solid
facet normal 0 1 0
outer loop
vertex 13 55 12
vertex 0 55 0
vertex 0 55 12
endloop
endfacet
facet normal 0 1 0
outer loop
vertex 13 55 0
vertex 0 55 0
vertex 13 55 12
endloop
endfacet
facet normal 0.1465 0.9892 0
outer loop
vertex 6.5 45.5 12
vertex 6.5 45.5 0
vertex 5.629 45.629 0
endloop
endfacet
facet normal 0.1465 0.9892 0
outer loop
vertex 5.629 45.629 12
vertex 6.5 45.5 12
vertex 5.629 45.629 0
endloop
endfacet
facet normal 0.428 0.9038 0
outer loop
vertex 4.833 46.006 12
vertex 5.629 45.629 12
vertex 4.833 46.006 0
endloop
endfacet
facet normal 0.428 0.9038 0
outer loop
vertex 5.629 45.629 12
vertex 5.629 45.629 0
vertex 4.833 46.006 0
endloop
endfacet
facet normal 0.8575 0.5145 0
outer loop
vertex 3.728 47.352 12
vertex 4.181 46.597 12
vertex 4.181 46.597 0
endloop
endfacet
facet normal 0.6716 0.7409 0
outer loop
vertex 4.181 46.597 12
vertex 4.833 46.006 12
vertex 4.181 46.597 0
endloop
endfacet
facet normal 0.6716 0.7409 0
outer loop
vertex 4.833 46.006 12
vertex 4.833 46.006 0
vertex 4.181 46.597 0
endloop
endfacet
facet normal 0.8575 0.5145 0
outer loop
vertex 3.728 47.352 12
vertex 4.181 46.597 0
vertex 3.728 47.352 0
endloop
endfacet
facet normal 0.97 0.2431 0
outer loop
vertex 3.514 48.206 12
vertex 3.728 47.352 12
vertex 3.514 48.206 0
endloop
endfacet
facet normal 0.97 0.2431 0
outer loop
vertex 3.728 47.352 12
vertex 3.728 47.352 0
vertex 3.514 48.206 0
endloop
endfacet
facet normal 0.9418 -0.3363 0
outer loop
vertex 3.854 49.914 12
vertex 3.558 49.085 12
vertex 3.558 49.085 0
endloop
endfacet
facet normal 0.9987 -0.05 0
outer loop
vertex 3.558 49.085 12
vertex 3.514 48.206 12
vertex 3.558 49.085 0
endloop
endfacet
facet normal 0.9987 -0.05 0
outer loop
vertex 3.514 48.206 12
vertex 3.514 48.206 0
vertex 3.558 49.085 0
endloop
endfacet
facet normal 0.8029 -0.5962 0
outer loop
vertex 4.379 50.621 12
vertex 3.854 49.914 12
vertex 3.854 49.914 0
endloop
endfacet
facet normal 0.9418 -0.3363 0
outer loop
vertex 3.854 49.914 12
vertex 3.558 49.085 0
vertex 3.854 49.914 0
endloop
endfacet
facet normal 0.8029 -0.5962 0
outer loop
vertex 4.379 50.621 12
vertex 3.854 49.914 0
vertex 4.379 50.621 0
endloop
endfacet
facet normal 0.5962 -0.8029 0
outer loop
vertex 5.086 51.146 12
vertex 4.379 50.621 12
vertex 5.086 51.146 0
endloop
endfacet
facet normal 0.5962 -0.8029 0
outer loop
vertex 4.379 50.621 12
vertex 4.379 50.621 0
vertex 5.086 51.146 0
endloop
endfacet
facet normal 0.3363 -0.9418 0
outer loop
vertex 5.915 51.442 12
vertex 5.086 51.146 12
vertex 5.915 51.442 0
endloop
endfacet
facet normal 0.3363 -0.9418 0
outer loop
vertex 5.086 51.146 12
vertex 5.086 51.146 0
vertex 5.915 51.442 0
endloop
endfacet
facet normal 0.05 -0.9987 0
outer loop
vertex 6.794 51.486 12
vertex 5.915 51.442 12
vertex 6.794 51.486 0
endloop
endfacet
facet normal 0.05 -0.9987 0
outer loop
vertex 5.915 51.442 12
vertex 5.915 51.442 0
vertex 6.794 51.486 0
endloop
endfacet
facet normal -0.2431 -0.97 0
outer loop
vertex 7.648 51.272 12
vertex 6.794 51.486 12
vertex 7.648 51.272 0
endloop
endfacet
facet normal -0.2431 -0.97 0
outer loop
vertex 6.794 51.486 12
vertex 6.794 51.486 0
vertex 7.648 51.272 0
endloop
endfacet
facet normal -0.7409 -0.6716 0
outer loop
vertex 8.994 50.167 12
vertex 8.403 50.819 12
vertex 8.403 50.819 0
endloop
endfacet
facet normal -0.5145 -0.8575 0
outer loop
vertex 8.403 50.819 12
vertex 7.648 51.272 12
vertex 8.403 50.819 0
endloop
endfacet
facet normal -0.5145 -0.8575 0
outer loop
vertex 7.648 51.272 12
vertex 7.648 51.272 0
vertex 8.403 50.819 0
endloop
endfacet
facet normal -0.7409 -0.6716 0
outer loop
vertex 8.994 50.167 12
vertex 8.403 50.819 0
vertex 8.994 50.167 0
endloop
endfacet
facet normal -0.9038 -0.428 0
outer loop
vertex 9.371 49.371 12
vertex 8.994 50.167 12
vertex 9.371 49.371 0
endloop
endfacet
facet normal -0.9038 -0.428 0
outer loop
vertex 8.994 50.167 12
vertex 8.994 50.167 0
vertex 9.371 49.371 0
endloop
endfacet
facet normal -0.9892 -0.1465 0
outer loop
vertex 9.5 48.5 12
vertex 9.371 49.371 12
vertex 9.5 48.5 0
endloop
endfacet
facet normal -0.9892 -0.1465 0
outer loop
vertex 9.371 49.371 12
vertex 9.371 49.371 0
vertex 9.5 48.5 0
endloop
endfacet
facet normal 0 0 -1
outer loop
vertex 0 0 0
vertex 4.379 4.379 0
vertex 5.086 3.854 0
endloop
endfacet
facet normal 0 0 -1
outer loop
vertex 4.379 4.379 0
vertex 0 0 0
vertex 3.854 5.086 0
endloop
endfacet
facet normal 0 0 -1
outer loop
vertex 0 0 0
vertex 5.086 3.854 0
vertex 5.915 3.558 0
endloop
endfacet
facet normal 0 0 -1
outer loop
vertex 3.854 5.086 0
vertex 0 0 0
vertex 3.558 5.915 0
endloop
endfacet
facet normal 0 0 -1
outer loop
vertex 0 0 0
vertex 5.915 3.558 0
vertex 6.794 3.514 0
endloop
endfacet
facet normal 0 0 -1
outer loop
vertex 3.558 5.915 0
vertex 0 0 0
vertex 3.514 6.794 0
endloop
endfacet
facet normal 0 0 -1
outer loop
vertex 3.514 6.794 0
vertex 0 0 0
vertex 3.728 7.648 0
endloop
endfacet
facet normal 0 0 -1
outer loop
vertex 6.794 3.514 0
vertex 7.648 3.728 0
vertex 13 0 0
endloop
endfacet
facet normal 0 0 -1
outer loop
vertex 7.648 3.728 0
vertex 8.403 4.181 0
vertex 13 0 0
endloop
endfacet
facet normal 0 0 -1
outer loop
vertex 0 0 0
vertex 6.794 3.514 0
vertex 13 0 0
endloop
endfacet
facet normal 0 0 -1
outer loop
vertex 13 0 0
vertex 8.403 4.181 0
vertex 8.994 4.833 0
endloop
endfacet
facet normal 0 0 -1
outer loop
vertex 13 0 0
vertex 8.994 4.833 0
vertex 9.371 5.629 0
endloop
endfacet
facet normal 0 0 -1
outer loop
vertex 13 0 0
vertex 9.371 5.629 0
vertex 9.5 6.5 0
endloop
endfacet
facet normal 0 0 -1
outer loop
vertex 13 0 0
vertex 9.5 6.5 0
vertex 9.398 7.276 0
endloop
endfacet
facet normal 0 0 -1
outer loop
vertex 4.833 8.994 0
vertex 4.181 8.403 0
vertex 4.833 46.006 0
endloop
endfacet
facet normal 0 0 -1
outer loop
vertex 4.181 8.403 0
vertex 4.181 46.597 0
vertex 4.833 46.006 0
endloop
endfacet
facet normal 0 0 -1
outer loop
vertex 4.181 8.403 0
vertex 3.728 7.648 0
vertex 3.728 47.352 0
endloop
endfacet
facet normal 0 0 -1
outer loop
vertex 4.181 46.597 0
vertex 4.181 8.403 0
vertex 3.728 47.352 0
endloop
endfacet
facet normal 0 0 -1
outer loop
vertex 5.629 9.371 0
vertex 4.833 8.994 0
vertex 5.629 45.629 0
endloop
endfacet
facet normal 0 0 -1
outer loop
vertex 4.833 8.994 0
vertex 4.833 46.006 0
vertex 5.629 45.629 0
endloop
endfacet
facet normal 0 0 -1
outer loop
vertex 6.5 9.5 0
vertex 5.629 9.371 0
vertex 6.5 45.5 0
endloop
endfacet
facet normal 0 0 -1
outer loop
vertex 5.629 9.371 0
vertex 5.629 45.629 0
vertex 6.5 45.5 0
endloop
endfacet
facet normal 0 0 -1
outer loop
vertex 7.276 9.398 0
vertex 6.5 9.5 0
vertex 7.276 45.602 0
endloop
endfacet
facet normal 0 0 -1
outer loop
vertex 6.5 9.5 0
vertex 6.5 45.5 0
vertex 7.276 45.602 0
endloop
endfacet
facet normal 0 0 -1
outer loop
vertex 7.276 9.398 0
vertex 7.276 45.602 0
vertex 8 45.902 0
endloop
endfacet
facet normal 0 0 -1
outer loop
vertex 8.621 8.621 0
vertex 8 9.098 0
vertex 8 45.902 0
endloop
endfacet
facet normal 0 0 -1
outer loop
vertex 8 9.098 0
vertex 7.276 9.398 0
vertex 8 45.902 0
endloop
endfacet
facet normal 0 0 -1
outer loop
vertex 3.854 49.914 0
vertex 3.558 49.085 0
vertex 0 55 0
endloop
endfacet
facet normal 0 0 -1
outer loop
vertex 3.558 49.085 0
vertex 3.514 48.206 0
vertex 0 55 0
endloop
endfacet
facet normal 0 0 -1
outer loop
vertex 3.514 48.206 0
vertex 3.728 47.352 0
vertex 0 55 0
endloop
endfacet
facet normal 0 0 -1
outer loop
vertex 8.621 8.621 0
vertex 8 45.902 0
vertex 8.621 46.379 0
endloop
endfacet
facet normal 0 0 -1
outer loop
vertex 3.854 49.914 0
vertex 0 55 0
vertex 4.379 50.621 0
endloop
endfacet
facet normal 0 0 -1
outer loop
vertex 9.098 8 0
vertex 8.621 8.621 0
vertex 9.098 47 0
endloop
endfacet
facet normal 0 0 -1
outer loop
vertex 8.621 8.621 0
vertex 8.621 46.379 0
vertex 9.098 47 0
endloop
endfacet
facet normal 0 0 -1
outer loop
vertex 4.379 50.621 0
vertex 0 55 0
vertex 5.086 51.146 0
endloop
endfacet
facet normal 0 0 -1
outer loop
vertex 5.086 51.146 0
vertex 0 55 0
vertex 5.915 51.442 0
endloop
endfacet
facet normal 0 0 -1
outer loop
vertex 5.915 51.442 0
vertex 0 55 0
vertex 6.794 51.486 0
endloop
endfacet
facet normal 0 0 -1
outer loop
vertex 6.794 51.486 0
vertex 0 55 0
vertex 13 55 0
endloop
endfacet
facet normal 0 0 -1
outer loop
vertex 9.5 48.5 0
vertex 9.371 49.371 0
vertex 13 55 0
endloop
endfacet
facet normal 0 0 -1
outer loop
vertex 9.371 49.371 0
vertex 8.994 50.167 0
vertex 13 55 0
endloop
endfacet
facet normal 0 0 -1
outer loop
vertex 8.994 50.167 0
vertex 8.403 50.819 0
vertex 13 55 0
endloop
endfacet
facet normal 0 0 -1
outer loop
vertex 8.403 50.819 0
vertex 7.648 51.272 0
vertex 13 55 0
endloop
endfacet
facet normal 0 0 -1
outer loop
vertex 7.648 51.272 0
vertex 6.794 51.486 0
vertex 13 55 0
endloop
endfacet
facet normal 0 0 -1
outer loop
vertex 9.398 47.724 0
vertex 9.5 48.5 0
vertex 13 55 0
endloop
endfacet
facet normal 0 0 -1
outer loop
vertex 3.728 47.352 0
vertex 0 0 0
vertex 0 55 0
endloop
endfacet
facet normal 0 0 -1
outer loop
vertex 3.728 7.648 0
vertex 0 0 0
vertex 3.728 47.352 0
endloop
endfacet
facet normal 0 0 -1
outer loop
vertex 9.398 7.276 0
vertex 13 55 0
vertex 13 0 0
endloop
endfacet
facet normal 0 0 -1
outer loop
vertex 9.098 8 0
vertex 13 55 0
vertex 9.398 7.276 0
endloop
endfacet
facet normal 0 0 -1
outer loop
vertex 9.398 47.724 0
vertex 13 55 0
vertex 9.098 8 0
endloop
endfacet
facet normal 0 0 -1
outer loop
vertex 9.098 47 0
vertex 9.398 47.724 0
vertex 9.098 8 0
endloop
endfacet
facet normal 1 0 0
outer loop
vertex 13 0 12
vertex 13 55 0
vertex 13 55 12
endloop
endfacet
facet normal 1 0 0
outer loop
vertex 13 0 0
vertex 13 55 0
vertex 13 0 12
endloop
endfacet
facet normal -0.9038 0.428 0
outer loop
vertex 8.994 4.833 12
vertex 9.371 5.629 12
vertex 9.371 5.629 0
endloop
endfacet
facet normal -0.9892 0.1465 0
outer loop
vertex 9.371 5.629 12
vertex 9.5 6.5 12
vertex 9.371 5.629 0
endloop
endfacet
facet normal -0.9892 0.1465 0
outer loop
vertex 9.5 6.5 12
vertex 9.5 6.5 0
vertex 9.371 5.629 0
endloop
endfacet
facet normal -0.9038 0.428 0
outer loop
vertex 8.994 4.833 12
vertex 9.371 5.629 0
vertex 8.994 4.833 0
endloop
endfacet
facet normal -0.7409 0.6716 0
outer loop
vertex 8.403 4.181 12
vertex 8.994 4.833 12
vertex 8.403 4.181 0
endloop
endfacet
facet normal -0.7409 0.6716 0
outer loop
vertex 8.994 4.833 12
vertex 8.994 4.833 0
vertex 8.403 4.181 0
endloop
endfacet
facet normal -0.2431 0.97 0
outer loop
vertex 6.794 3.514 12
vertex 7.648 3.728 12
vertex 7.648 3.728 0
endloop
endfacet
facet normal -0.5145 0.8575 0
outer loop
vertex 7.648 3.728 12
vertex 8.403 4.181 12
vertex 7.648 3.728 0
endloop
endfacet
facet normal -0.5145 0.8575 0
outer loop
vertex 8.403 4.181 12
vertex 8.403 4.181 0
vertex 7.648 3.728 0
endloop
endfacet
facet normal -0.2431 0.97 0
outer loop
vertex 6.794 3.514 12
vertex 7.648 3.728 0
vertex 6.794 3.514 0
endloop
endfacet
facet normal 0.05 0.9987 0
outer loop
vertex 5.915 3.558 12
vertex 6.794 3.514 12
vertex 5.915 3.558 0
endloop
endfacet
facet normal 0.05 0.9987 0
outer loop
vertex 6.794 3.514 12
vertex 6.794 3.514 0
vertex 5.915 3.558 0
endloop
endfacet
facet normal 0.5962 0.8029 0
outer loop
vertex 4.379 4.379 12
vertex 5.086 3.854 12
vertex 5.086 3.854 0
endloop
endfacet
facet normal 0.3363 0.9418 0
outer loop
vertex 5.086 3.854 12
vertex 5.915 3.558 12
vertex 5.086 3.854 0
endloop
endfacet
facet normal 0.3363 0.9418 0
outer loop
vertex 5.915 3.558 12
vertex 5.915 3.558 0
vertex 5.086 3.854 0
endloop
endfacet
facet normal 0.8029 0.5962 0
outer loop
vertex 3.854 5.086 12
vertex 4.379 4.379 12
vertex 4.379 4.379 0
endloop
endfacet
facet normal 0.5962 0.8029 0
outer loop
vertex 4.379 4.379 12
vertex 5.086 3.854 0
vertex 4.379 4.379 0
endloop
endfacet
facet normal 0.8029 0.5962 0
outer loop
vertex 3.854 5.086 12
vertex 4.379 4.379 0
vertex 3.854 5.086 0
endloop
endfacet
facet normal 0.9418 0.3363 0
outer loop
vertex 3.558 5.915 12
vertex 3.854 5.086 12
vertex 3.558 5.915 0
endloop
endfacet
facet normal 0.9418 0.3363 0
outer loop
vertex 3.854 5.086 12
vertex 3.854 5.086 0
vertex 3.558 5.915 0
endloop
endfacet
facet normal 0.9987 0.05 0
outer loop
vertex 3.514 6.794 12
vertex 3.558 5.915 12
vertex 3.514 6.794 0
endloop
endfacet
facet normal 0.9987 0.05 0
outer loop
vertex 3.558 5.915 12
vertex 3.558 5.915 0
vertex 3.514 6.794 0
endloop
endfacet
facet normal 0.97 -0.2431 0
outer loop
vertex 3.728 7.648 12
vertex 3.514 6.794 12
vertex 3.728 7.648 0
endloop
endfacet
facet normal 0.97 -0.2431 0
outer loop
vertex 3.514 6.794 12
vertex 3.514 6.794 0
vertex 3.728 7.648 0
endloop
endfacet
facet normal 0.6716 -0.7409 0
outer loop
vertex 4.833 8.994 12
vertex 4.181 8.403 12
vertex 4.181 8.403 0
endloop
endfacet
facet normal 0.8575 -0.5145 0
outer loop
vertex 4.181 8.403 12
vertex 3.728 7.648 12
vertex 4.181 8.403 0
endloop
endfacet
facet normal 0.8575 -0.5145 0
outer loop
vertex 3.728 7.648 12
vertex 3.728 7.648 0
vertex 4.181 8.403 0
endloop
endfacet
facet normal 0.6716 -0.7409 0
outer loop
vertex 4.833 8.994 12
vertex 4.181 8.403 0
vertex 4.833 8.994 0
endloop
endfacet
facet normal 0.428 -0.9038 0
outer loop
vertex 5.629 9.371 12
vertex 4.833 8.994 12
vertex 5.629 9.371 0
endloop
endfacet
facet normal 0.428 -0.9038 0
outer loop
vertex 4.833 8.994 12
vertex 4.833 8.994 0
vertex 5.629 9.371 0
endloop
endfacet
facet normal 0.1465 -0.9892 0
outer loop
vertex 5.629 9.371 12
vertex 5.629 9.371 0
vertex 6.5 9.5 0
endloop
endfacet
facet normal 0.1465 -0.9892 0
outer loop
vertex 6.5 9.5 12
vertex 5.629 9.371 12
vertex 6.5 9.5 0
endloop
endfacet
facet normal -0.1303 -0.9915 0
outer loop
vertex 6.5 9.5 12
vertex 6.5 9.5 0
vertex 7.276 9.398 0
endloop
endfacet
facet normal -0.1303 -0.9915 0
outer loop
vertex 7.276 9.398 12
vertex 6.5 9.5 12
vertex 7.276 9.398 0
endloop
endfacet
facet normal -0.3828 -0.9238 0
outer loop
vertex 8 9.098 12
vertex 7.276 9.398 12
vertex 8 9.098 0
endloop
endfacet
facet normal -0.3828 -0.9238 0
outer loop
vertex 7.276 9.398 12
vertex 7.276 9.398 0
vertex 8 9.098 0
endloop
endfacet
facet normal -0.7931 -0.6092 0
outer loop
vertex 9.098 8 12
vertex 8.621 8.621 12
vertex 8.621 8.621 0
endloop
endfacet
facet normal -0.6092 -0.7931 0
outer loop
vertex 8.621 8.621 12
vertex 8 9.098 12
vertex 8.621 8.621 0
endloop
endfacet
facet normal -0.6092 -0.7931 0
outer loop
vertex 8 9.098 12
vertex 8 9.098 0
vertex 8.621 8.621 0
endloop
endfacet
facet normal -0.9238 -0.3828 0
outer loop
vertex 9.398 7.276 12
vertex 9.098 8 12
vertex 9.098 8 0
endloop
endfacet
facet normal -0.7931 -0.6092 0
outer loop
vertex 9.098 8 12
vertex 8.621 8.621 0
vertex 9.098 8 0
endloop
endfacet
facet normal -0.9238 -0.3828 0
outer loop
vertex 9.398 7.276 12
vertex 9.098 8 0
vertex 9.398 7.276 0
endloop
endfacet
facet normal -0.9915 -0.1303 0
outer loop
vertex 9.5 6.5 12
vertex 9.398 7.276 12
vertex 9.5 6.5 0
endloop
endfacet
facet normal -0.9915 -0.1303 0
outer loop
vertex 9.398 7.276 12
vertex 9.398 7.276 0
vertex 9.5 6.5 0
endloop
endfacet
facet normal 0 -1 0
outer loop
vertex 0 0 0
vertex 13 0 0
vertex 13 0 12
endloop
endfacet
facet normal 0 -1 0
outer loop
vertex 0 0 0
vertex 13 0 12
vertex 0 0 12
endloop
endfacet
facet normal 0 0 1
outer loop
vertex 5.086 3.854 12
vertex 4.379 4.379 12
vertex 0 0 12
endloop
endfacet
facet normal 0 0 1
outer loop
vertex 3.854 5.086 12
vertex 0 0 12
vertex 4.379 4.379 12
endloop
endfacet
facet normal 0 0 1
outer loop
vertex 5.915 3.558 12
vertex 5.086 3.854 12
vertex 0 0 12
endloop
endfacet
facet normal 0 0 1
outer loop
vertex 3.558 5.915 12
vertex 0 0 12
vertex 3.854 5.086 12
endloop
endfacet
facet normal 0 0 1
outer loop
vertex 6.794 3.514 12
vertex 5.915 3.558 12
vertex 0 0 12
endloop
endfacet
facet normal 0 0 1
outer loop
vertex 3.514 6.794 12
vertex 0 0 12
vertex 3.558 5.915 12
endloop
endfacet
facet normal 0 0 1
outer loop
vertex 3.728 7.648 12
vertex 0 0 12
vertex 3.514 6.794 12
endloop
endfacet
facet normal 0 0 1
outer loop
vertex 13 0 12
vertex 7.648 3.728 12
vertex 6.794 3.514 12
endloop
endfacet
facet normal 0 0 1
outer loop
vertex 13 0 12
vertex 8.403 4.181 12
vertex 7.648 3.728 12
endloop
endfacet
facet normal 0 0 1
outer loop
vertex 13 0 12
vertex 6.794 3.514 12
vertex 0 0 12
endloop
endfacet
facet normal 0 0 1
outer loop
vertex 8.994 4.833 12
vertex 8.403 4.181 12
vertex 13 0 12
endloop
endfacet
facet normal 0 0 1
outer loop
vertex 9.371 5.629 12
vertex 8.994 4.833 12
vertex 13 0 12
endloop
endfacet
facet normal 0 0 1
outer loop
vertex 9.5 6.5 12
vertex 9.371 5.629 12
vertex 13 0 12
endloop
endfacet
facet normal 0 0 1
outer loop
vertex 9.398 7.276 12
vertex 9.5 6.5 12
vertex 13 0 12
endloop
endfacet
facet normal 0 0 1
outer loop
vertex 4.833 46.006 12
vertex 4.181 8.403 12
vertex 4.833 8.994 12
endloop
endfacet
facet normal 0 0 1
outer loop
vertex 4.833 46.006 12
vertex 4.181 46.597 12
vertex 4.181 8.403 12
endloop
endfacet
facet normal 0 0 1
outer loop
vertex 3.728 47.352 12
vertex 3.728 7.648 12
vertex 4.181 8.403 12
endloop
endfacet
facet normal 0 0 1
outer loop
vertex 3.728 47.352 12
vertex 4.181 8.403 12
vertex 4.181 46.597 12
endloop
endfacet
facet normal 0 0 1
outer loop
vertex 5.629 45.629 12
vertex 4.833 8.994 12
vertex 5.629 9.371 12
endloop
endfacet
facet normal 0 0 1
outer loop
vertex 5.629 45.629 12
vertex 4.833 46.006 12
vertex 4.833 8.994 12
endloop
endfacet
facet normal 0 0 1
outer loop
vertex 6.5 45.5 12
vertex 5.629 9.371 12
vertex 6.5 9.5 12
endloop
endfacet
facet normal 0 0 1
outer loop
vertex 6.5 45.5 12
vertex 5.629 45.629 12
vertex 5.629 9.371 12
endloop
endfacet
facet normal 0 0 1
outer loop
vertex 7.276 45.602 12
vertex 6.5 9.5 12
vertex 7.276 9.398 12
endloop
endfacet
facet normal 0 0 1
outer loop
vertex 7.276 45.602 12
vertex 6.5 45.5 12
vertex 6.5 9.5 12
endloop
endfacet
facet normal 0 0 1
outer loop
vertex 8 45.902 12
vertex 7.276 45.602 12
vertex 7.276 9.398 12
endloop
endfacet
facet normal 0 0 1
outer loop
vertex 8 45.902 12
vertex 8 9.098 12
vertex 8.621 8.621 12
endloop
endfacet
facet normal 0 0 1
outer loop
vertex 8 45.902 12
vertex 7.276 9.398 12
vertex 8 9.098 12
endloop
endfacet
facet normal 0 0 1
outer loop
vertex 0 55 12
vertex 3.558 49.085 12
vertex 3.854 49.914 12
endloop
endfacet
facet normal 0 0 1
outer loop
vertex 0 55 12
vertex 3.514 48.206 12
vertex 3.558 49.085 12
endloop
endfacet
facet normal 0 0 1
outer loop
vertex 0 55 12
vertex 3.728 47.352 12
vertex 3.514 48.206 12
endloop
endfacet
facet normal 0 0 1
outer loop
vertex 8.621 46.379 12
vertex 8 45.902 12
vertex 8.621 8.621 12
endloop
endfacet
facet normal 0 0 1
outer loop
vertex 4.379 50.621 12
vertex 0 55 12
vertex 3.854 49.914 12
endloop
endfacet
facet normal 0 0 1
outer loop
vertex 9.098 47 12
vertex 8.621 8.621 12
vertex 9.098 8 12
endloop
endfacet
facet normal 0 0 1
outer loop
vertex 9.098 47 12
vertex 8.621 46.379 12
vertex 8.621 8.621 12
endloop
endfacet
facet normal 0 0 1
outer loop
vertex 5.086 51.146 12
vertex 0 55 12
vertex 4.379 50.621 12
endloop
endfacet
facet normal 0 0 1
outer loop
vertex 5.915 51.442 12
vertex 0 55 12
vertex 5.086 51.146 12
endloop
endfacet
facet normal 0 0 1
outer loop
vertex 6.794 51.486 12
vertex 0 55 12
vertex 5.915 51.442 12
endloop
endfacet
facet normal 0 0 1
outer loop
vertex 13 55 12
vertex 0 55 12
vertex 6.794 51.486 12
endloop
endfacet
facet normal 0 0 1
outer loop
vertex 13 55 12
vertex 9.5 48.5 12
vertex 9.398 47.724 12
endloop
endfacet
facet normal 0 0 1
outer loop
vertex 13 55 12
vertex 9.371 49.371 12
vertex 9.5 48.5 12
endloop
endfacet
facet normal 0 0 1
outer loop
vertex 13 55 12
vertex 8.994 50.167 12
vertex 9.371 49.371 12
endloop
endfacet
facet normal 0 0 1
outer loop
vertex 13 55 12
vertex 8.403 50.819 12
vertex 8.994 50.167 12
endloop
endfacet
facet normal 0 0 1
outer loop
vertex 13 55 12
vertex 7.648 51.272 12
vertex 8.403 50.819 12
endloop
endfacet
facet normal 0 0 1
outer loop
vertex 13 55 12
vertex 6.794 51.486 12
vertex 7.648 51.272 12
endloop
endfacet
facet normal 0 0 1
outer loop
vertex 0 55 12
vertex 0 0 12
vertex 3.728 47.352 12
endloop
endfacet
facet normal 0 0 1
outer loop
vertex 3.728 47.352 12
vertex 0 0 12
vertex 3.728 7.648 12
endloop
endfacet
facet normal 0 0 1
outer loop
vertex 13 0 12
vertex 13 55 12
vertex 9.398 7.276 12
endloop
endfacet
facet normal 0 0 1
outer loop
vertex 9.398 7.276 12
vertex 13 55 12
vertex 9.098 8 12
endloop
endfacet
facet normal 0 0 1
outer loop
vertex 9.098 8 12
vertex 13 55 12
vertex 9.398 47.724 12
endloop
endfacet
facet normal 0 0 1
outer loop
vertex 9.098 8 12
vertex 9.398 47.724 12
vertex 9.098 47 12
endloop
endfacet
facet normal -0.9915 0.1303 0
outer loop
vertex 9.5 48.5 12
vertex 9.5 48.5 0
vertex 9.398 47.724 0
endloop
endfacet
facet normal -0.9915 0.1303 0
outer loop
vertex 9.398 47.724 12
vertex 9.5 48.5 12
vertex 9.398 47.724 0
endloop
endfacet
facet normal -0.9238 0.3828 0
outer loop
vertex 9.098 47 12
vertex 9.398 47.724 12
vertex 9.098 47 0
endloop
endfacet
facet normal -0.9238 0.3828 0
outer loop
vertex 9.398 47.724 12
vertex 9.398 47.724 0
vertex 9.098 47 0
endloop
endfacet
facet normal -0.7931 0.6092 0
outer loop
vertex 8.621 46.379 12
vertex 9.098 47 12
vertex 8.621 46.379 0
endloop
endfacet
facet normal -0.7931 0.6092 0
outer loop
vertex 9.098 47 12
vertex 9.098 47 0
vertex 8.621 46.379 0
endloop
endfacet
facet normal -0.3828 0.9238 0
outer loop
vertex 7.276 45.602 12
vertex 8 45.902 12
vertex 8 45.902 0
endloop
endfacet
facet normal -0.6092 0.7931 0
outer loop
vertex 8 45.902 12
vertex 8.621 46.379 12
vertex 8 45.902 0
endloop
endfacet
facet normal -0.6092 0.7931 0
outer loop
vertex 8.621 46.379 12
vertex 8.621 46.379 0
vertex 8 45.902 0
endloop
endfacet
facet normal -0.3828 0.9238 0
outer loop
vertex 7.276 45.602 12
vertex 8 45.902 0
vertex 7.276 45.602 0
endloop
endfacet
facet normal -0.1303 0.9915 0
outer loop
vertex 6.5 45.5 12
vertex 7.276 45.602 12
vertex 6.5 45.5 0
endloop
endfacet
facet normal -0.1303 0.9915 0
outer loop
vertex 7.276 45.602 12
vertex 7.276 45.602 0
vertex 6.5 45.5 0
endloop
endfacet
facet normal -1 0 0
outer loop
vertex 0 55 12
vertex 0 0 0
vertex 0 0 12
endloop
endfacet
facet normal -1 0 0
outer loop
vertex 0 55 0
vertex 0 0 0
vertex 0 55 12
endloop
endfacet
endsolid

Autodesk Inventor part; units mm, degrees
ref_plane "YZ Plane" through (0, 0, 0) normal (1, 0, 0) x (0, 1, 0)
ref_plane "XZ Plane" through (0, 0, 0) normal (0, 1, 0) x (-1, 0, 0)
ref_plane "XY Plane" through (0, 0, 0) normal (0, 0, 1) x (1, 0, 0)
sketch "Sketch1" plane through (0, 0, 0) normal (0, 0, 1) x (1, 0, 0)
  line L0 (0, 55) -> (13, 55)
  line L1 (13, 55) -> (13, 0)
  line L2 (13, 0) -> (0, 0)
  line L3 (0, 0) -> (0, 55)
  circle A0 centre (6.5, 48.5) radius 3
  circle A1 centre (6.5, 6.5) radius 3
  line L4 (6.5, 48.5) -> (6.5, 6.5)
  dimension "d2" = 6
  dimension "d3" = 6
  dimension "d4" = 42
  dimension "d5" = 55
  dimension "d6" = 13
  dimension "d7" = 6.5
  dimension "d8" = 6.5
extrude "Extrusion1" add sketch "Sketch1" along normal blind 12
equation "\"d3\" = d2"
equation "\"d7\" = 0.5 * d6"
equation "\"d8\" = -0.5 * d4 + 0.5 * d5"
properties part number "plateplummer" material "PMMA Plastic"
